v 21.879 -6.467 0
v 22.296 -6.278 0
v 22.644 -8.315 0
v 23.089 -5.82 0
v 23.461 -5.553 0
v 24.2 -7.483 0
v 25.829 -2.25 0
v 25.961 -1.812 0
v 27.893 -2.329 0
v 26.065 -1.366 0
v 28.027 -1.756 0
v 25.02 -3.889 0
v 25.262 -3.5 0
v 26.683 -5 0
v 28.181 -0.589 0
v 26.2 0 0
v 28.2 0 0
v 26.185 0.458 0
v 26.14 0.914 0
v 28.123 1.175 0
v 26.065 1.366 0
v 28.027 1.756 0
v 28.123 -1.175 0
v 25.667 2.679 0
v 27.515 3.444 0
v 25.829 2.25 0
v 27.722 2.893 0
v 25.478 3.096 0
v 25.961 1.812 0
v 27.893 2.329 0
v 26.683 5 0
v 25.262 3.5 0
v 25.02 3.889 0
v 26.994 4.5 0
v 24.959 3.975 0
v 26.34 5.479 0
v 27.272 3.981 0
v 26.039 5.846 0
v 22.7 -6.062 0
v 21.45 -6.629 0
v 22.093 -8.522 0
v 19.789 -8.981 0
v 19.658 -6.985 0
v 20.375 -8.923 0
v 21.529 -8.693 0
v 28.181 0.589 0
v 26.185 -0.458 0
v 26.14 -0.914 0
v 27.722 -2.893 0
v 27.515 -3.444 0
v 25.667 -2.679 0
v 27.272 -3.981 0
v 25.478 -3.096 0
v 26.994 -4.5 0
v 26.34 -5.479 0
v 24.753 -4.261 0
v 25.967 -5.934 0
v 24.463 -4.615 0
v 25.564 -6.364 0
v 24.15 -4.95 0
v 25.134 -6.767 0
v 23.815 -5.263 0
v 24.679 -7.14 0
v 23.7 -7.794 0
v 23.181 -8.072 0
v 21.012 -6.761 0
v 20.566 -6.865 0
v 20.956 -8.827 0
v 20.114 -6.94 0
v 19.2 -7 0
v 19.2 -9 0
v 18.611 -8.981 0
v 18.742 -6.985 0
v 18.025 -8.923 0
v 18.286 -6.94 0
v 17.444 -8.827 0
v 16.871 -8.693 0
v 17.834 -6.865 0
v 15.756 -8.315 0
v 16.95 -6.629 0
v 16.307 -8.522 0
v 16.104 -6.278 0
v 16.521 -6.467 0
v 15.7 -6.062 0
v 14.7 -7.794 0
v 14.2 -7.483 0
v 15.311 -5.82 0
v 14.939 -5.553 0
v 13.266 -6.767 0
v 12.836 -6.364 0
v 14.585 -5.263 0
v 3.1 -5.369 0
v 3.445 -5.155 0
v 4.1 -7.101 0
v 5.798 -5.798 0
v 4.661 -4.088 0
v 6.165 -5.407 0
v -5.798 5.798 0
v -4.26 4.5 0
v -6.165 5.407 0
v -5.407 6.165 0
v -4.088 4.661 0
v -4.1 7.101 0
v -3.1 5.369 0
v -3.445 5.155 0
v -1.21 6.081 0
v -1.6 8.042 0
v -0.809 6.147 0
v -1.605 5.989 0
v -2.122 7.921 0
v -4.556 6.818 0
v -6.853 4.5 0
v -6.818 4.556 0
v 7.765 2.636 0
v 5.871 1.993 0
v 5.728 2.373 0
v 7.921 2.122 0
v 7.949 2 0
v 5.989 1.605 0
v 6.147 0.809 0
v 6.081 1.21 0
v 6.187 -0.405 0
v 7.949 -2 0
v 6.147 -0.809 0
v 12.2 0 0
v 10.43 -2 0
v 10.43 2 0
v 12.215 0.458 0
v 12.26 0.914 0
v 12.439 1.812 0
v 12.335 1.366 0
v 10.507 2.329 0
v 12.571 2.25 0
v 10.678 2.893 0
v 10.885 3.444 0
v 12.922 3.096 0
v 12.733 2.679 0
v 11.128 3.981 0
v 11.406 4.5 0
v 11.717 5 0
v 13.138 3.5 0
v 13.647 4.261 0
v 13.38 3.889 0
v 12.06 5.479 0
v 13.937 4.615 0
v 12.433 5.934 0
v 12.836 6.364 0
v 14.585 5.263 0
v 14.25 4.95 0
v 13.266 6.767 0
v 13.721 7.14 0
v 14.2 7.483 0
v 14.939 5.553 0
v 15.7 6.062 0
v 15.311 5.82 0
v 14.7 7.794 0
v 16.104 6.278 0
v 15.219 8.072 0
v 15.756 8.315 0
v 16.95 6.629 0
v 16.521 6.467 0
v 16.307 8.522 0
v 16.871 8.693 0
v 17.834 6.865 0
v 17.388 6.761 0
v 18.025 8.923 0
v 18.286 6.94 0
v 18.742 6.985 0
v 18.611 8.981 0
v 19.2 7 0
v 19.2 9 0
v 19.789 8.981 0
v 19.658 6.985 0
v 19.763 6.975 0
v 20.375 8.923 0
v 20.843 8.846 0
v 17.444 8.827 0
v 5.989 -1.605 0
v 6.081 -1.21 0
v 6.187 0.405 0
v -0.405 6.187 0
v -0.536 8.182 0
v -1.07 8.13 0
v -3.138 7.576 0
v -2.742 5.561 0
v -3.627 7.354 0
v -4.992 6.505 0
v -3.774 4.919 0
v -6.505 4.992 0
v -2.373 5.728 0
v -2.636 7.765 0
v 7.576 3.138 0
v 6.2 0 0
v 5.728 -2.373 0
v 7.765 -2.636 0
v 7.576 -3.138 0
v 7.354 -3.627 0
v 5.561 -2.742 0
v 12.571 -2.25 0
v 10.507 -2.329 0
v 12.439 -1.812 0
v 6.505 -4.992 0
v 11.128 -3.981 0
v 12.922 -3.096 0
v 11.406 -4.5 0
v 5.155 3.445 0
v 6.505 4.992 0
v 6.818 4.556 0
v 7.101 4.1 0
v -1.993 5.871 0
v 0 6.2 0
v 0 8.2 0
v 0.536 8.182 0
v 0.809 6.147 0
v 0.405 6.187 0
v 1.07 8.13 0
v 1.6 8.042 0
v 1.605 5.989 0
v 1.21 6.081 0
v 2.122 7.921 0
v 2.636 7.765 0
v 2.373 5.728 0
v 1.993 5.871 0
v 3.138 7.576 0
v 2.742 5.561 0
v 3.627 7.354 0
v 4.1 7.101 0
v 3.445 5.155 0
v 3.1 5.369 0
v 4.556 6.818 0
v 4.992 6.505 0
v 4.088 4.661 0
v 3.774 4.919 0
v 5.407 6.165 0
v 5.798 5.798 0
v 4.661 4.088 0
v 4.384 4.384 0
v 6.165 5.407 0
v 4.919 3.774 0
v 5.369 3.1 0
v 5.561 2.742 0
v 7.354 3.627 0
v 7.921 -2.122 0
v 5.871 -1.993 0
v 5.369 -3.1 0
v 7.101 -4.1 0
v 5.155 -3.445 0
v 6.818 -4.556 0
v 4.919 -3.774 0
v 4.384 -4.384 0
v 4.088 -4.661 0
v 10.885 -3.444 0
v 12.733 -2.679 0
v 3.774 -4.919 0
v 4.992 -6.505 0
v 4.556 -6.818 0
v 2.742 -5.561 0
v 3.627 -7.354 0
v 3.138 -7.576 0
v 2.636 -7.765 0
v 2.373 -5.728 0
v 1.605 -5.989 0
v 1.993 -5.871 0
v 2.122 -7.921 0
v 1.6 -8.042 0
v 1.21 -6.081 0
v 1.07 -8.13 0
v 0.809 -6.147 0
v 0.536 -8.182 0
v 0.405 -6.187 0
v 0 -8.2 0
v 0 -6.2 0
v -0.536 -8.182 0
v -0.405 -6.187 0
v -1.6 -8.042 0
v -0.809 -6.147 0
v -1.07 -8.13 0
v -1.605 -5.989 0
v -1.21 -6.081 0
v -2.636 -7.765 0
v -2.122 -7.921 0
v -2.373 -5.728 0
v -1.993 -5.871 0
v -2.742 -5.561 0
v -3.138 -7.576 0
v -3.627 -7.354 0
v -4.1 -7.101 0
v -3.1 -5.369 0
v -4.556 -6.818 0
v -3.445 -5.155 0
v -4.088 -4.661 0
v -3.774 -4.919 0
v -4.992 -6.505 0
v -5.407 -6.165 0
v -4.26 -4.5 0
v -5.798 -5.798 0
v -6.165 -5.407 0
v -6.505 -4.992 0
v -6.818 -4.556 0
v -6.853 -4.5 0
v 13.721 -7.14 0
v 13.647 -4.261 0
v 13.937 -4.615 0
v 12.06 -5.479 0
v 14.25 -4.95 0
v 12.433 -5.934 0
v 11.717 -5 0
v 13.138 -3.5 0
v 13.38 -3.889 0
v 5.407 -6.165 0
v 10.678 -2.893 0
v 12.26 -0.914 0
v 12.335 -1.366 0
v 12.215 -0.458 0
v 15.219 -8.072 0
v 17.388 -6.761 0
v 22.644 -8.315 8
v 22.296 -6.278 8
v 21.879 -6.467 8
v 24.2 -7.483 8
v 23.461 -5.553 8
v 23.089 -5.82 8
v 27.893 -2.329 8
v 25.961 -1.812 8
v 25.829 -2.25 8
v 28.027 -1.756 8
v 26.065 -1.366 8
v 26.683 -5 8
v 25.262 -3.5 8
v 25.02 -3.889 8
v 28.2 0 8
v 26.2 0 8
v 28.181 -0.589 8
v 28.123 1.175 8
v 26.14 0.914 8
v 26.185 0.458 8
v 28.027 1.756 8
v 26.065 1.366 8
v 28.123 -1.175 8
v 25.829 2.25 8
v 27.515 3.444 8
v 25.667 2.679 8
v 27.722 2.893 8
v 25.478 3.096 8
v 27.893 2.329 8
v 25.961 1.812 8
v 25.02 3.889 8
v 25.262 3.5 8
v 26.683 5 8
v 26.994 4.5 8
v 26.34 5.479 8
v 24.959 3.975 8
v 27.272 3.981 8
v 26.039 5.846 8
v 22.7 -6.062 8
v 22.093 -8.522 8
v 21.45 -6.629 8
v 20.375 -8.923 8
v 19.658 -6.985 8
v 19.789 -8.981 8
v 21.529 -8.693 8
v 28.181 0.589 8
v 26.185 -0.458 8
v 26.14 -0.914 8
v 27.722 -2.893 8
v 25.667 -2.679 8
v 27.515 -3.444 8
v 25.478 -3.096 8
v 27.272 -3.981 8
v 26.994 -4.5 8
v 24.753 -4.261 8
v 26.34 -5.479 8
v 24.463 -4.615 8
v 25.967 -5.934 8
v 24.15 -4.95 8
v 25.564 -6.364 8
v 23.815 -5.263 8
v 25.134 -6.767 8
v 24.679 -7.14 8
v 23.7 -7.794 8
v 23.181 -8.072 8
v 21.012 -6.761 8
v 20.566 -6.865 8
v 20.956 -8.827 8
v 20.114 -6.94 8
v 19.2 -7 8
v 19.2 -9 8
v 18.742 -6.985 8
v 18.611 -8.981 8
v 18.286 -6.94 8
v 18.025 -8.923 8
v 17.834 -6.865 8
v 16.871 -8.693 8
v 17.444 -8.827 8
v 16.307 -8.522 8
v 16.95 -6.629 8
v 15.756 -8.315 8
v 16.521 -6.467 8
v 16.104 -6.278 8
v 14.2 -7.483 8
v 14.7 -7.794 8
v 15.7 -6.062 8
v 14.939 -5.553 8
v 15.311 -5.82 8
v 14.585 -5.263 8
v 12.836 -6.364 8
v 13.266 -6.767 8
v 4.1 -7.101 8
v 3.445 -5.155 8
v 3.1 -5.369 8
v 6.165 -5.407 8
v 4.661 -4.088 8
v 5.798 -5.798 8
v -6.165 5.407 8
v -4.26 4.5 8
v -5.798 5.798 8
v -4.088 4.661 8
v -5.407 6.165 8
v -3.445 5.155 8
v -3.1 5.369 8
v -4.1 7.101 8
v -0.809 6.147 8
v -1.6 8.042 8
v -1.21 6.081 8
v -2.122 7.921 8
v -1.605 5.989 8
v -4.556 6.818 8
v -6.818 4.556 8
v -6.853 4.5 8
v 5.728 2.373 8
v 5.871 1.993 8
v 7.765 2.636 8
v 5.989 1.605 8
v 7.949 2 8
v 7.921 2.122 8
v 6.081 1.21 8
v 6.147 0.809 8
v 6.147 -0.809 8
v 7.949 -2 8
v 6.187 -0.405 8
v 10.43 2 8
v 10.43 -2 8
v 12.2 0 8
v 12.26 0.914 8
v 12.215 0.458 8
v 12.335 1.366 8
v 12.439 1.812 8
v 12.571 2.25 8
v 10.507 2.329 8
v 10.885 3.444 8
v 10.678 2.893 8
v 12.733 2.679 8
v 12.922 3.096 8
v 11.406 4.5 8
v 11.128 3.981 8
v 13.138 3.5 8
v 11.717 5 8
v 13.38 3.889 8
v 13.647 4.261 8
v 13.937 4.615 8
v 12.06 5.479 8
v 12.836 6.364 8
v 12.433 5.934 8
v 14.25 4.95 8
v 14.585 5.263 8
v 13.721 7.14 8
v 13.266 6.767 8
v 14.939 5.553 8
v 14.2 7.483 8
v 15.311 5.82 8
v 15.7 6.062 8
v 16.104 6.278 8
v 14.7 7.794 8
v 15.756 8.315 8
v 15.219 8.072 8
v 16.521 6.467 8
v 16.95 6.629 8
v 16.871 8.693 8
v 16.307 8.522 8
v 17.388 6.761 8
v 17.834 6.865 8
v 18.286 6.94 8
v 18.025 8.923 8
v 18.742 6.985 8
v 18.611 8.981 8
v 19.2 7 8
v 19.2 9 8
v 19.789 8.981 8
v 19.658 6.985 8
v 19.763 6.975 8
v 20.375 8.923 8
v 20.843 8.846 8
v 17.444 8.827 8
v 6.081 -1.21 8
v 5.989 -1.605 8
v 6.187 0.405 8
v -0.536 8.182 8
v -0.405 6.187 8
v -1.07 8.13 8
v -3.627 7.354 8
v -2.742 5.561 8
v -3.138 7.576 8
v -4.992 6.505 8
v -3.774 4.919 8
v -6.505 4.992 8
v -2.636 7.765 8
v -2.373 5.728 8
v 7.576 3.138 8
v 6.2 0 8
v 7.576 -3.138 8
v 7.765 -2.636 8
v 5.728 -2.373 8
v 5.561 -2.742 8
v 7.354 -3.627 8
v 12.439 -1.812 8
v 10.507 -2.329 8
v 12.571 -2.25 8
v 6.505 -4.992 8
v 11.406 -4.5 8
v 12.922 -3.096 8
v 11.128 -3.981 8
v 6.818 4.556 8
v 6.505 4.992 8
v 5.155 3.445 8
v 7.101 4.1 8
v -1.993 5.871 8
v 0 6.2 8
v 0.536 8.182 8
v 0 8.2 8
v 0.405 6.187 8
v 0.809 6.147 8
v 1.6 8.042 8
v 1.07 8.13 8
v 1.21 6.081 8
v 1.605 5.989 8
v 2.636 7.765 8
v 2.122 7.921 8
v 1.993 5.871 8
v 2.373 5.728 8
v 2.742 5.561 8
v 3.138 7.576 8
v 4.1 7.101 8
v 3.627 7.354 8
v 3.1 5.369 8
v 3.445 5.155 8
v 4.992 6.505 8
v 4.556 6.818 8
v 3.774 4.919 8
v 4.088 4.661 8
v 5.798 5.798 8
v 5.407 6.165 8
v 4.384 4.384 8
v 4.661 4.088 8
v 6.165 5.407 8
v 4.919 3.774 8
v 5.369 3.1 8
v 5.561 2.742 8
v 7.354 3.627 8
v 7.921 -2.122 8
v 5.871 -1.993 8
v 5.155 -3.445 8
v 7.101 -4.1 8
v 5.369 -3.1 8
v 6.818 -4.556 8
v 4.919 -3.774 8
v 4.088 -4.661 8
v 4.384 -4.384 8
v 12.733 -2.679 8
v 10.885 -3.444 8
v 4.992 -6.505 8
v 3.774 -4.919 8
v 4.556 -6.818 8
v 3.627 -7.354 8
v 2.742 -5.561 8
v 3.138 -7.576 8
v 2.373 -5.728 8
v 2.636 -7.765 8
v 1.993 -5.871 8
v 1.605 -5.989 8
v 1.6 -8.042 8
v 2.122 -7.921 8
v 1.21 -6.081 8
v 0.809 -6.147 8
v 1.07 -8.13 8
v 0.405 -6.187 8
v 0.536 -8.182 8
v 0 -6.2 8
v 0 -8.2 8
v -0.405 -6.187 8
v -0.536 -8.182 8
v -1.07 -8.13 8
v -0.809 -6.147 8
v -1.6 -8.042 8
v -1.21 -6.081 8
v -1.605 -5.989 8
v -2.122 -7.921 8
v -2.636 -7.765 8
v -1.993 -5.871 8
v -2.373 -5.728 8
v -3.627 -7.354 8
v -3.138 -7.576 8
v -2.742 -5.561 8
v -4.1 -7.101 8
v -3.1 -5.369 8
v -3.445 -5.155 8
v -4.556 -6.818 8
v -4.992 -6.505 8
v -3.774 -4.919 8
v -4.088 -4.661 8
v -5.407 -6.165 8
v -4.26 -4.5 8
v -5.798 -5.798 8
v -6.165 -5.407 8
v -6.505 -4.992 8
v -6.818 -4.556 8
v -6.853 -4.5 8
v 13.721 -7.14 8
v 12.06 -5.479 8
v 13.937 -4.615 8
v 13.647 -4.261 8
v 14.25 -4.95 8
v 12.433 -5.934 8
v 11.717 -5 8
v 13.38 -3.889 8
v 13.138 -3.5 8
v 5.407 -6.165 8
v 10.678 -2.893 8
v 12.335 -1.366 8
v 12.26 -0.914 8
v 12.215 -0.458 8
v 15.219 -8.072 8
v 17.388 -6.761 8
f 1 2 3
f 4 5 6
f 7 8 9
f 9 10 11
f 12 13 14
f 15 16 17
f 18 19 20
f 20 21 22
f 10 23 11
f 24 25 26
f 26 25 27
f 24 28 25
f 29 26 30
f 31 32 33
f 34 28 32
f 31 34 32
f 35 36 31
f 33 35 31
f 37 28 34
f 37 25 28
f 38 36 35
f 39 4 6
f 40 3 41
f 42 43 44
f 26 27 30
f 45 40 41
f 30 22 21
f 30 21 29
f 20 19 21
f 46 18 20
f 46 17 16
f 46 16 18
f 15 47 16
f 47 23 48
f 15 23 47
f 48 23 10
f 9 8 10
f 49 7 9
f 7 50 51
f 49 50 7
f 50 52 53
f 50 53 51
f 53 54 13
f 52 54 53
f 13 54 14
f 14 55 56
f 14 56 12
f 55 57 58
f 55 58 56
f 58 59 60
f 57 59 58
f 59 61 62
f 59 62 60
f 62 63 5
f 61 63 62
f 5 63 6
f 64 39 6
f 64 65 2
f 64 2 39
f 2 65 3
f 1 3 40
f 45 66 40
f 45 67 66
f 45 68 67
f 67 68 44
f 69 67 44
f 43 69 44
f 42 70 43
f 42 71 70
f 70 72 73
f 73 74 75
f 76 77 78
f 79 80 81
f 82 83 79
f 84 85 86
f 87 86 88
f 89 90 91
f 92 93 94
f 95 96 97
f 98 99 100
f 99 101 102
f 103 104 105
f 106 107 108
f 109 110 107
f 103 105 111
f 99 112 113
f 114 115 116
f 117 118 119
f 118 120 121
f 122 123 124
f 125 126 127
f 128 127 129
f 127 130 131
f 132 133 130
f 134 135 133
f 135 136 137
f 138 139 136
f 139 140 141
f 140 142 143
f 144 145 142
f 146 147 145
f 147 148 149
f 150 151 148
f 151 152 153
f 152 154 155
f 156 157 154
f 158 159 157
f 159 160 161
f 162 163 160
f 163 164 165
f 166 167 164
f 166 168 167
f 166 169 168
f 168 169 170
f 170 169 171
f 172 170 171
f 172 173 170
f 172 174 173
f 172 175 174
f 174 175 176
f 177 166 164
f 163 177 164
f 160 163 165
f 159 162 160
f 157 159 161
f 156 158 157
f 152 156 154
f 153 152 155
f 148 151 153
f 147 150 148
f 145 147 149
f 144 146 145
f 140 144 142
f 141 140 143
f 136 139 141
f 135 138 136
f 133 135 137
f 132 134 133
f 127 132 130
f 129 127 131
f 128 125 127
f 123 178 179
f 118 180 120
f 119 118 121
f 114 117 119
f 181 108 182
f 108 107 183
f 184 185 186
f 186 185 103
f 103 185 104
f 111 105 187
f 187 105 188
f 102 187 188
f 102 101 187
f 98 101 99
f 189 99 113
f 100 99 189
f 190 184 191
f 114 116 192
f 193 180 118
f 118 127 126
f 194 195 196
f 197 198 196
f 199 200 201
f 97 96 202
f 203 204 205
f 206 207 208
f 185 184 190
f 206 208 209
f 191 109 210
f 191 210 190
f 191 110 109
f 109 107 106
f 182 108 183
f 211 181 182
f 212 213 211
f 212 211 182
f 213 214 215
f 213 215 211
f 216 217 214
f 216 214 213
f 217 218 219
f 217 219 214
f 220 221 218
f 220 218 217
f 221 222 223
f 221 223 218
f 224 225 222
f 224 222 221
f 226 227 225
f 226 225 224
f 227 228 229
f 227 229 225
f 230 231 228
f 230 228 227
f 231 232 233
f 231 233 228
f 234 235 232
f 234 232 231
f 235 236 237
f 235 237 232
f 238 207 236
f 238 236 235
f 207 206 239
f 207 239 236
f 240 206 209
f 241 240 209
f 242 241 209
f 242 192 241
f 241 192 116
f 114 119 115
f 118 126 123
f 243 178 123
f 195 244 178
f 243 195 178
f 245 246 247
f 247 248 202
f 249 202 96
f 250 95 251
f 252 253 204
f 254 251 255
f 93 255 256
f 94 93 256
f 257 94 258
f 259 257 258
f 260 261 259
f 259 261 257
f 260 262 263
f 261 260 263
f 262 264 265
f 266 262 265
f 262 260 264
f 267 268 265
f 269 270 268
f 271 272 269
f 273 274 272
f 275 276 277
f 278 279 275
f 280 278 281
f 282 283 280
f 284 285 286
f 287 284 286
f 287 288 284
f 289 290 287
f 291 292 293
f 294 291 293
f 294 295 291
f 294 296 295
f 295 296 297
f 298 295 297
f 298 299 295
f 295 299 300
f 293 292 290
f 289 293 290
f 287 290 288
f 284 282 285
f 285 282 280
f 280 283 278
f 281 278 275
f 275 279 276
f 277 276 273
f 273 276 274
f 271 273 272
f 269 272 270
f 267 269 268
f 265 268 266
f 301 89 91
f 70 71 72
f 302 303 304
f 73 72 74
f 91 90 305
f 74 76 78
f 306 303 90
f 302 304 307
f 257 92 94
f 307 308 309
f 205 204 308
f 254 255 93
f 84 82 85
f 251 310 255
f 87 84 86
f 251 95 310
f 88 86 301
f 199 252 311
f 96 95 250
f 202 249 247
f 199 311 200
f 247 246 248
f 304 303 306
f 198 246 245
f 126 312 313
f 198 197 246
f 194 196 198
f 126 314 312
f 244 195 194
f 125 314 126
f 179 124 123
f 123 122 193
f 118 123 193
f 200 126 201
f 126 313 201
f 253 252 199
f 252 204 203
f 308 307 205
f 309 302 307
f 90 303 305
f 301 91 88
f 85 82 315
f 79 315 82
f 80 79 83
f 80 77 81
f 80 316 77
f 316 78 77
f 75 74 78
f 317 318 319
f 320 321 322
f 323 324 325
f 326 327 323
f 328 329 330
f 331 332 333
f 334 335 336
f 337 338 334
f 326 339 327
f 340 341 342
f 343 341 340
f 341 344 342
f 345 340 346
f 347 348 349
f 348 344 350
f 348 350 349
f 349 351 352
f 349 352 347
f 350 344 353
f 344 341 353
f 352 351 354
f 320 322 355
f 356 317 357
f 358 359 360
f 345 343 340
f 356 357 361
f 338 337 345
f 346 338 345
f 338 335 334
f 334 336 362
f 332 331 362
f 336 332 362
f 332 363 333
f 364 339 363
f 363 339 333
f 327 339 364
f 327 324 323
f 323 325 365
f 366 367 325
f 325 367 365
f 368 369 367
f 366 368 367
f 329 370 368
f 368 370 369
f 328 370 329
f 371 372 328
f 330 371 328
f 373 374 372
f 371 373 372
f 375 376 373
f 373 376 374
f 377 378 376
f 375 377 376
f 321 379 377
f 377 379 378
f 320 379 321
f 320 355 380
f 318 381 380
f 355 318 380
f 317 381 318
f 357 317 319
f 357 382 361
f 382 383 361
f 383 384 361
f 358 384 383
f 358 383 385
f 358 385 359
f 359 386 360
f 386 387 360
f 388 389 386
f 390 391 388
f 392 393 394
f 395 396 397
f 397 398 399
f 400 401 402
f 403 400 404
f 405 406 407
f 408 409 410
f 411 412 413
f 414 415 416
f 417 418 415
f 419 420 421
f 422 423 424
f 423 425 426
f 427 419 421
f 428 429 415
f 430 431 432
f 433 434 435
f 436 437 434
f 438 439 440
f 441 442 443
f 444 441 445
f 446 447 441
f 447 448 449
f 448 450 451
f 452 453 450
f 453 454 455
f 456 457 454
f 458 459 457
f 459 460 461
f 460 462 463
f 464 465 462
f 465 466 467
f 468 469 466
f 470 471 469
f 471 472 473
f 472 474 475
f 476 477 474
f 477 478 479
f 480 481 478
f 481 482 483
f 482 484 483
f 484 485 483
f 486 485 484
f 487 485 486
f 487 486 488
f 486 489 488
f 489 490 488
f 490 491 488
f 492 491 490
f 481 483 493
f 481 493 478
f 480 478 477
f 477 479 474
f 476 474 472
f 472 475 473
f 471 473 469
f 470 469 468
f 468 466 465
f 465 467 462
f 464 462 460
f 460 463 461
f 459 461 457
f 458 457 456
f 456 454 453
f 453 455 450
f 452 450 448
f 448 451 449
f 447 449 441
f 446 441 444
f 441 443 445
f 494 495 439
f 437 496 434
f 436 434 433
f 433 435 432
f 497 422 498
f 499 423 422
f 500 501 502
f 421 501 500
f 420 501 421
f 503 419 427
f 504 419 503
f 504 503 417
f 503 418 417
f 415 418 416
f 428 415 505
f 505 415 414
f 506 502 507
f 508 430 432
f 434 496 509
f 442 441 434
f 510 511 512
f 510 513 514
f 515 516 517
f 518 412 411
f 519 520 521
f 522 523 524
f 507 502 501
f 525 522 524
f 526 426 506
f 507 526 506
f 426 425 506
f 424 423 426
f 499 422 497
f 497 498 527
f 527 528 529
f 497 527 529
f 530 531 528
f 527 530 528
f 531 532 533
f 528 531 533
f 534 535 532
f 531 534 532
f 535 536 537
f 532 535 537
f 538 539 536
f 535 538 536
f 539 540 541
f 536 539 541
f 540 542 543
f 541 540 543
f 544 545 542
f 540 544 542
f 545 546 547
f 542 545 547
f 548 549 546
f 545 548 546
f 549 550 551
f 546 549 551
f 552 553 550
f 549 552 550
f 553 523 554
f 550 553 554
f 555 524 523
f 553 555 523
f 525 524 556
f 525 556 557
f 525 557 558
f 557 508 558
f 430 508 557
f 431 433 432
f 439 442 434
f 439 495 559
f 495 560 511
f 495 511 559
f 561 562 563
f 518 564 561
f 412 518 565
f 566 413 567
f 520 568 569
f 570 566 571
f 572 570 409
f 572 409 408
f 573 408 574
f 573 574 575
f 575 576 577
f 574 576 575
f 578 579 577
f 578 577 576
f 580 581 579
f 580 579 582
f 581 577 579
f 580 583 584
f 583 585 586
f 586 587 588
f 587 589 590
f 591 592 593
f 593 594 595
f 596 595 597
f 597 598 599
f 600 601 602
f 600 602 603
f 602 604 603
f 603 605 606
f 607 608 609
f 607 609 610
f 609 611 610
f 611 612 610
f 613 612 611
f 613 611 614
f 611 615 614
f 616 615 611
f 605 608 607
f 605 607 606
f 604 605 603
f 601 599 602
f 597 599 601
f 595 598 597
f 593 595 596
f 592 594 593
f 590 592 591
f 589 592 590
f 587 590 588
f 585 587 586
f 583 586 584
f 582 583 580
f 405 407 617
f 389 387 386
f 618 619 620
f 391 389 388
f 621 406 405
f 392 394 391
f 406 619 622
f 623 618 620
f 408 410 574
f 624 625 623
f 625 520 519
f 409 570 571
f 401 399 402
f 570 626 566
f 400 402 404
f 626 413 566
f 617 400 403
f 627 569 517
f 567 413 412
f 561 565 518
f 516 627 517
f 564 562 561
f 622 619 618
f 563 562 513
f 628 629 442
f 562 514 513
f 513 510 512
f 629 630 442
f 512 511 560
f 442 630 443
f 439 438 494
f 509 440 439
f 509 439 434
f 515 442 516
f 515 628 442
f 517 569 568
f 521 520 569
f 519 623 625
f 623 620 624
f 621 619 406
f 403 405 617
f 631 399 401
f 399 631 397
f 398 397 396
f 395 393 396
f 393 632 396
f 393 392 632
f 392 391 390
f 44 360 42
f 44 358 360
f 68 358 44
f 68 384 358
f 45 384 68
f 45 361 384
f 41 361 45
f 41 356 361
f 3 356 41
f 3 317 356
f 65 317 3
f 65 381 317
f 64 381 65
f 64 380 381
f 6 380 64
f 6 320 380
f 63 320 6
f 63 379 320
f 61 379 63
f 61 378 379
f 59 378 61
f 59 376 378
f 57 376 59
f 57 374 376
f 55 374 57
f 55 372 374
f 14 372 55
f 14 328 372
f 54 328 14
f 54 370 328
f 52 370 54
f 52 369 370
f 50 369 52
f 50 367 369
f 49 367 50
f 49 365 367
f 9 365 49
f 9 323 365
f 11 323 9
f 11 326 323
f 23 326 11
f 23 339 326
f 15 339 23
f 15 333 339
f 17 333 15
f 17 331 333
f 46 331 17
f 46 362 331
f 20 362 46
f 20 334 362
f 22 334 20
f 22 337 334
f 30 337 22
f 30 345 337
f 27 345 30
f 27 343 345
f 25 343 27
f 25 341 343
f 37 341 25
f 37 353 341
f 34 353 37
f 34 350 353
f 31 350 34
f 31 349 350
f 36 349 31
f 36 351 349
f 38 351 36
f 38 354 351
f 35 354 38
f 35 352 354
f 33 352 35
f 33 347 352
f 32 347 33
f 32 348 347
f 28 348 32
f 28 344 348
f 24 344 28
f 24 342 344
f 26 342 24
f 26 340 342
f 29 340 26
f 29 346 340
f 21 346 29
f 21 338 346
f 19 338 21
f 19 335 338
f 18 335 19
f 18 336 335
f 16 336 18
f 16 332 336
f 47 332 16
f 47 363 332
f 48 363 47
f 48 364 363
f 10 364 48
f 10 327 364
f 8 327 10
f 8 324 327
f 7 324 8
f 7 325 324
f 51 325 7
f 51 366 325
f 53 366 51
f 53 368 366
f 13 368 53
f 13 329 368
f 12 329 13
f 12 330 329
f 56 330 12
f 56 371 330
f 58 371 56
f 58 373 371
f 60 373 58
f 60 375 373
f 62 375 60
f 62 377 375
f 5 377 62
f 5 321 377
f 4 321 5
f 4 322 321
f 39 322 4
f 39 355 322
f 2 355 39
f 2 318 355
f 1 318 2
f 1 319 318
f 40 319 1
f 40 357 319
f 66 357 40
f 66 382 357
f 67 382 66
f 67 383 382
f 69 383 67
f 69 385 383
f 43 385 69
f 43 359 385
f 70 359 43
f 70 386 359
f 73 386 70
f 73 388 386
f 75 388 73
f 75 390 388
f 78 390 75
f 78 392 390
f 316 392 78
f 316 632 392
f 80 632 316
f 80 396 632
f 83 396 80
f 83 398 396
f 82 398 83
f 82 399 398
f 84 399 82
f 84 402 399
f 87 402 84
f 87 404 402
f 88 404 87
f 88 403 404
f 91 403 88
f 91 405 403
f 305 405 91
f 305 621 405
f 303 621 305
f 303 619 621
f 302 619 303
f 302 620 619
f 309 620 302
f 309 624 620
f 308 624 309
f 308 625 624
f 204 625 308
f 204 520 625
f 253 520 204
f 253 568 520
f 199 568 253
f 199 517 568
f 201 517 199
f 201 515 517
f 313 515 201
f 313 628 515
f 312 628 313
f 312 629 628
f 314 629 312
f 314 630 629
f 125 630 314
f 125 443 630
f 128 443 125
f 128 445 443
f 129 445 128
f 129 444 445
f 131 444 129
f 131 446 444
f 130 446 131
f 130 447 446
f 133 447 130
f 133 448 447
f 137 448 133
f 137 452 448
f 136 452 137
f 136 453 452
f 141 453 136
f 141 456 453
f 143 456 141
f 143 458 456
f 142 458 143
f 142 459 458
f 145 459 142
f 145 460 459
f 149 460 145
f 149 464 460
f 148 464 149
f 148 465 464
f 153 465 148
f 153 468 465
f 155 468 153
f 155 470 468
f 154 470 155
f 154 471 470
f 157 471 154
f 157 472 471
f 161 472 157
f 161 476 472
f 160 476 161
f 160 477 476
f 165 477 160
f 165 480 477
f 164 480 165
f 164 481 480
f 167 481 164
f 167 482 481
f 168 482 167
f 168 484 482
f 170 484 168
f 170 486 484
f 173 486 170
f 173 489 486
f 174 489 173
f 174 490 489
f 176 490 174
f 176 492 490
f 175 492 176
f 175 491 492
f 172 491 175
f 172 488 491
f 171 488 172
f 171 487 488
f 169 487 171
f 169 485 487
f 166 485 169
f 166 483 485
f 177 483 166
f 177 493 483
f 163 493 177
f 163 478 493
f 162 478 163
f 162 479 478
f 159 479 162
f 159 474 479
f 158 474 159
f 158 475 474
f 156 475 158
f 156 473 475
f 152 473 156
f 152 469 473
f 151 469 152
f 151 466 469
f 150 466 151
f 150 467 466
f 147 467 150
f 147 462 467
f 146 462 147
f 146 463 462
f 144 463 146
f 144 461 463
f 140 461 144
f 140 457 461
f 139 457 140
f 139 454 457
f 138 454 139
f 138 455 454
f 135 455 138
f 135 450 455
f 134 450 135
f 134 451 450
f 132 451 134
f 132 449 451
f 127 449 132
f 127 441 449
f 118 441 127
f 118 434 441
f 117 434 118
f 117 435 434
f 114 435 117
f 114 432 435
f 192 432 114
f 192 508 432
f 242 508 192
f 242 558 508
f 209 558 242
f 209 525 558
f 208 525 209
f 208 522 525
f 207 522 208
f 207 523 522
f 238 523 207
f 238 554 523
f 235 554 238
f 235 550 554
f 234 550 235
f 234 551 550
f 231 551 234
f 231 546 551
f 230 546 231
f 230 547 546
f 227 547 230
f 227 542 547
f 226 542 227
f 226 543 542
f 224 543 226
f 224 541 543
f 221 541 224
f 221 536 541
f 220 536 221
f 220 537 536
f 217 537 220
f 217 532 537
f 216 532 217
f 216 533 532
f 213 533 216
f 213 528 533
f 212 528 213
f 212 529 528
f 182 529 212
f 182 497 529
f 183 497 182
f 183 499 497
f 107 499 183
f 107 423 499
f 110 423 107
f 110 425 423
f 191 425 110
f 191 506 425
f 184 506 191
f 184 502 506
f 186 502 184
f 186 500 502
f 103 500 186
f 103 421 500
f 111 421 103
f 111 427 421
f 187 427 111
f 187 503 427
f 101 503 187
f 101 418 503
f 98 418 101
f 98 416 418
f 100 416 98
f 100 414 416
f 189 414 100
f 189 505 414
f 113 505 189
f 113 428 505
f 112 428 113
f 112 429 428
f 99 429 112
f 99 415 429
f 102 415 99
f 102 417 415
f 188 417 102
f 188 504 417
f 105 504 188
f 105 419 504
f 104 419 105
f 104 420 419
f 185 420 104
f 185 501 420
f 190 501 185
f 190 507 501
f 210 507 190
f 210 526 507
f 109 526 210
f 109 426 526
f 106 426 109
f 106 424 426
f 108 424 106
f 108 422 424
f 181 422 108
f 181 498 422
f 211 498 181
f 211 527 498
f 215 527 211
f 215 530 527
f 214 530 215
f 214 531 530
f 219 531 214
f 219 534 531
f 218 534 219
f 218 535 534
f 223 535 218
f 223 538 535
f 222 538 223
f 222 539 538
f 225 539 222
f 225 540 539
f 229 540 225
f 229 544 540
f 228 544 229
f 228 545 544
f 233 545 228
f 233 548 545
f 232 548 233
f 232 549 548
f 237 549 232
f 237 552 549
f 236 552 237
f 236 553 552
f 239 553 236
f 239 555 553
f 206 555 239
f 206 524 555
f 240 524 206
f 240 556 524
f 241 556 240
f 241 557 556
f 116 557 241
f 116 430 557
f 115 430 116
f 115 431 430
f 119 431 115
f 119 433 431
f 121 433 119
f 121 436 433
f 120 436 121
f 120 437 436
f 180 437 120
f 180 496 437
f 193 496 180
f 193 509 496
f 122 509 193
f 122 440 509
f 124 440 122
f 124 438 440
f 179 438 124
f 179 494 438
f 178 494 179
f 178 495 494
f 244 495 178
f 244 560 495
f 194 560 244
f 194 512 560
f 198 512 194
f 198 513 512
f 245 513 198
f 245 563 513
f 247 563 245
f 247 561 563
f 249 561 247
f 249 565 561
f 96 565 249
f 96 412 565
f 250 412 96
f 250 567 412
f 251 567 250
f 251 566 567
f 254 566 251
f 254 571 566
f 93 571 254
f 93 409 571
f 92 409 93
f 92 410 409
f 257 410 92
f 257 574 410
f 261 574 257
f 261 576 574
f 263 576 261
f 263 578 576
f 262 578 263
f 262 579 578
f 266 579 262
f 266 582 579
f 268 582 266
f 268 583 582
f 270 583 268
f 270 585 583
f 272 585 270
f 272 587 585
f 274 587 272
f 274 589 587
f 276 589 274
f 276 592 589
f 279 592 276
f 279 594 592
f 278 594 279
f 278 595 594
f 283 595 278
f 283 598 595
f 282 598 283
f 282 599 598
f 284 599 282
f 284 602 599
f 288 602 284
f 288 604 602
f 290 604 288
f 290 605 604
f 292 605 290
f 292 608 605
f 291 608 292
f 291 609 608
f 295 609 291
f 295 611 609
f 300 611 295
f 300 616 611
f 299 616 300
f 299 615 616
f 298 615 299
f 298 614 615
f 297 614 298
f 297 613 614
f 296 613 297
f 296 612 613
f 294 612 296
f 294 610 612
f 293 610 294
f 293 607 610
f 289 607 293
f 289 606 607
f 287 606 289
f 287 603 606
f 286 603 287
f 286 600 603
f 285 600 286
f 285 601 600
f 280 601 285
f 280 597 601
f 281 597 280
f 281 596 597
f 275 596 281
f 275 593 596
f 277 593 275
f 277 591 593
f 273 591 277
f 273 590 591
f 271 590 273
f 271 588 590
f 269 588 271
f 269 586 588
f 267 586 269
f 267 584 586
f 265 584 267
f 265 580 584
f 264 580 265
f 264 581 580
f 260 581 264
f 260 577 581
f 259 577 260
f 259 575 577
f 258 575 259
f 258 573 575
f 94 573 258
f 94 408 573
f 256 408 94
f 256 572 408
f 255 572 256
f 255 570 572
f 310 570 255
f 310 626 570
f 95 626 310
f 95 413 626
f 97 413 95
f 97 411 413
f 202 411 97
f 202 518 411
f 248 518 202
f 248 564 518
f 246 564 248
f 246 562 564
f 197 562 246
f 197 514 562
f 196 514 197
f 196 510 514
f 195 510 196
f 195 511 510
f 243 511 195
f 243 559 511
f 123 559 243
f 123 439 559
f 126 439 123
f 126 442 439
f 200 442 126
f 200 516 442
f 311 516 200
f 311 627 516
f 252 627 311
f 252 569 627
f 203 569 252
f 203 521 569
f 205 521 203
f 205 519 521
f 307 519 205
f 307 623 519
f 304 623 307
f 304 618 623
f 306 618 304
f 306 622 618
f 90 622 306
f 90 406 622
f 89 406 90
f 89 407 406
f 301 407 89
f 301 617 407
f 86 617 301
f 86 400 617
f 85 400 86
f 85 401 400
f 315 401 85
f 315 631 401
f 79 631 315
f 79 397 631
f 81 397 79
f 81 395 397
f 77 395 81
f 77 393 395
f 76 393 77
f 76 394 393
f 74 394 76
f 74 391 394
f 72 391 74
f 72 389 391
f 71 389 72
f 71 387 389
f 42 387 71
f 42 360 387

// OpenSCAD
// Plant stake clip
// Hope Arising EPICS team (ASU) - original design. License: CC BY 4.0 (commercial use allowed).
// Snaps onto a stake or bamboo pole and holds a plant stem loosely beside it
// (tomatoes, peppers, beans, young trees). Prints flat, no supports.

/* [Size] */
// Diameter of the stake or pole
stake_diameter = 12;       // [4:0.5:40]
// Diameter of the plant stem. The loop is made a little bigger so the stem can grow.
stem_diameter = 10;        // [3:0.5:40]
// Height of the clip (how tall it prints)
clip_height = 8;           // [4:1:20]
// Thickness of the clip ring. Thinner snaps on more easily.
wall_thickness = 2;        // [1.2:0.2:4]

/* [Hidden] */
$fn = 96;

// ring with an opening of 'gap' width facing direction 'ang'
module c_ring(r_in, t, gap, ang) {
    difference() {
        circle(r = r_in + t);
        circle(r = r_in);
        rotate(ang) translate([0, -gap / 2]) square([r_in + t + 1, gap]);
    }
}

module plant_stake_clip() {
    rs = stake_diameter / 2 + 0.2;          // snap fit on the stake
    rp = stem_diameter / 2 + 2;             // loose loop for the stem
    t  = wall_thickness;
    cx = rs + t + rp + t + 2;               // distance between ring centres
    linear_extrude(height = clip_height) {
        c_ring(rs, t, stake_diameter * 0.75, 180);              // stake: opening faces away
        translate([cx, 0]) c_ring(rp, t, stem_diameter * 0.6, 60);  // stem: opening to the side
        // bridge joining the two rings
        translate([rs + t / 2, -t]) square([cx - rs - rp - t, 2 * t]);
    }
}

plant_stake_clip();
